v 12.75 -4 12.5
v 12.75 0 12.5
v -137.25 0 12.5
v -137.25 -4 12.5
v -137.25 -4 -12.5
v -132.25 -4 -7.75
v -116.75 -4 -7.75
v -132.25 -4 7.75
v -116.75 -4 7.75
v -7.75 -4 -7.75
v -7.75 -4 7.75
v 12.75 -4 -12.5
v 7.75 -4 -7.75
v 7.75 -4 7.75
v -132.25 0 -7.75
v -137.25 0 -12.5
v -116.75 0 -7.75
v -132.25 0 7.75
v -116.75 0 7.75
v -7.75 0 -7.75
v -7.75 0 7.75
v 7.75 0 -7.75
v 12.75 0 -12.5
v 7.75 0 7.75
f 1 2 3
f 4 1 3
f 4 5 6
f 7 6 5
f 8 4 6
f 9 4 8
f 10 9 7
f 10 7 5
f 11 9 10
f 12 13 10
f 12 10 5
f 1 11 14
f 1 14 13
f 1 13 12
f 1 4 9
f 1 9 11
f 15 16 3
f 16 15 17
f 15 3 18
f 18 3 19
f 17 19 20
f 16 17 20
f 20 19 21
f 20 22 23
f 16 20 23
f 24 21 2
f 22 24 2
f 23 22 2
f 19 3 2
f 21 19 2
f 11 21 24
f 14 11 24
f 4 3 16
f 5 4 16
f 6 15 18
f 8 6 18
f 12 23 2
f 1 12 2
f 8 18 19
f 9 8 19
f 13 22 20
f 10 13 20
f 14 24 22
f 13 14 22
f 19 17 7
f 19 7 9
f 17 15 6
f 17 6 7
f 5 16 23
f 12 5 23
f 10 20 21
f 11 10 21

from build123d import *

# Parameters (mm, degrees)
F0_W     = 15.5
F0_H     = 15.5
F1_DEPTH = 4


with BuildPart() as f1:
    # F0 (on Front) → F1 (new body)
    with BuildSketch(Plane.XZ):
        Polygon((12.75, -12.5), (12.75, 0), (12.75, 12.5), (-137.25, 12.5), (-137.25, -12.5), align=None)
        with Locations((-124.5, 0)):
            Rectangle(F0_W, F0_H, mode=Mode.SUBTRACT)
        Polygon((-7.75, 7.75), (7.75, 7.75), (7.75, 0), (7.75, -7.75), (-7.75, -7.75), align=None, mode=Mode.SUBTRACT)
    extrude(amount=F1_DEPTH)


solid = f1.part
